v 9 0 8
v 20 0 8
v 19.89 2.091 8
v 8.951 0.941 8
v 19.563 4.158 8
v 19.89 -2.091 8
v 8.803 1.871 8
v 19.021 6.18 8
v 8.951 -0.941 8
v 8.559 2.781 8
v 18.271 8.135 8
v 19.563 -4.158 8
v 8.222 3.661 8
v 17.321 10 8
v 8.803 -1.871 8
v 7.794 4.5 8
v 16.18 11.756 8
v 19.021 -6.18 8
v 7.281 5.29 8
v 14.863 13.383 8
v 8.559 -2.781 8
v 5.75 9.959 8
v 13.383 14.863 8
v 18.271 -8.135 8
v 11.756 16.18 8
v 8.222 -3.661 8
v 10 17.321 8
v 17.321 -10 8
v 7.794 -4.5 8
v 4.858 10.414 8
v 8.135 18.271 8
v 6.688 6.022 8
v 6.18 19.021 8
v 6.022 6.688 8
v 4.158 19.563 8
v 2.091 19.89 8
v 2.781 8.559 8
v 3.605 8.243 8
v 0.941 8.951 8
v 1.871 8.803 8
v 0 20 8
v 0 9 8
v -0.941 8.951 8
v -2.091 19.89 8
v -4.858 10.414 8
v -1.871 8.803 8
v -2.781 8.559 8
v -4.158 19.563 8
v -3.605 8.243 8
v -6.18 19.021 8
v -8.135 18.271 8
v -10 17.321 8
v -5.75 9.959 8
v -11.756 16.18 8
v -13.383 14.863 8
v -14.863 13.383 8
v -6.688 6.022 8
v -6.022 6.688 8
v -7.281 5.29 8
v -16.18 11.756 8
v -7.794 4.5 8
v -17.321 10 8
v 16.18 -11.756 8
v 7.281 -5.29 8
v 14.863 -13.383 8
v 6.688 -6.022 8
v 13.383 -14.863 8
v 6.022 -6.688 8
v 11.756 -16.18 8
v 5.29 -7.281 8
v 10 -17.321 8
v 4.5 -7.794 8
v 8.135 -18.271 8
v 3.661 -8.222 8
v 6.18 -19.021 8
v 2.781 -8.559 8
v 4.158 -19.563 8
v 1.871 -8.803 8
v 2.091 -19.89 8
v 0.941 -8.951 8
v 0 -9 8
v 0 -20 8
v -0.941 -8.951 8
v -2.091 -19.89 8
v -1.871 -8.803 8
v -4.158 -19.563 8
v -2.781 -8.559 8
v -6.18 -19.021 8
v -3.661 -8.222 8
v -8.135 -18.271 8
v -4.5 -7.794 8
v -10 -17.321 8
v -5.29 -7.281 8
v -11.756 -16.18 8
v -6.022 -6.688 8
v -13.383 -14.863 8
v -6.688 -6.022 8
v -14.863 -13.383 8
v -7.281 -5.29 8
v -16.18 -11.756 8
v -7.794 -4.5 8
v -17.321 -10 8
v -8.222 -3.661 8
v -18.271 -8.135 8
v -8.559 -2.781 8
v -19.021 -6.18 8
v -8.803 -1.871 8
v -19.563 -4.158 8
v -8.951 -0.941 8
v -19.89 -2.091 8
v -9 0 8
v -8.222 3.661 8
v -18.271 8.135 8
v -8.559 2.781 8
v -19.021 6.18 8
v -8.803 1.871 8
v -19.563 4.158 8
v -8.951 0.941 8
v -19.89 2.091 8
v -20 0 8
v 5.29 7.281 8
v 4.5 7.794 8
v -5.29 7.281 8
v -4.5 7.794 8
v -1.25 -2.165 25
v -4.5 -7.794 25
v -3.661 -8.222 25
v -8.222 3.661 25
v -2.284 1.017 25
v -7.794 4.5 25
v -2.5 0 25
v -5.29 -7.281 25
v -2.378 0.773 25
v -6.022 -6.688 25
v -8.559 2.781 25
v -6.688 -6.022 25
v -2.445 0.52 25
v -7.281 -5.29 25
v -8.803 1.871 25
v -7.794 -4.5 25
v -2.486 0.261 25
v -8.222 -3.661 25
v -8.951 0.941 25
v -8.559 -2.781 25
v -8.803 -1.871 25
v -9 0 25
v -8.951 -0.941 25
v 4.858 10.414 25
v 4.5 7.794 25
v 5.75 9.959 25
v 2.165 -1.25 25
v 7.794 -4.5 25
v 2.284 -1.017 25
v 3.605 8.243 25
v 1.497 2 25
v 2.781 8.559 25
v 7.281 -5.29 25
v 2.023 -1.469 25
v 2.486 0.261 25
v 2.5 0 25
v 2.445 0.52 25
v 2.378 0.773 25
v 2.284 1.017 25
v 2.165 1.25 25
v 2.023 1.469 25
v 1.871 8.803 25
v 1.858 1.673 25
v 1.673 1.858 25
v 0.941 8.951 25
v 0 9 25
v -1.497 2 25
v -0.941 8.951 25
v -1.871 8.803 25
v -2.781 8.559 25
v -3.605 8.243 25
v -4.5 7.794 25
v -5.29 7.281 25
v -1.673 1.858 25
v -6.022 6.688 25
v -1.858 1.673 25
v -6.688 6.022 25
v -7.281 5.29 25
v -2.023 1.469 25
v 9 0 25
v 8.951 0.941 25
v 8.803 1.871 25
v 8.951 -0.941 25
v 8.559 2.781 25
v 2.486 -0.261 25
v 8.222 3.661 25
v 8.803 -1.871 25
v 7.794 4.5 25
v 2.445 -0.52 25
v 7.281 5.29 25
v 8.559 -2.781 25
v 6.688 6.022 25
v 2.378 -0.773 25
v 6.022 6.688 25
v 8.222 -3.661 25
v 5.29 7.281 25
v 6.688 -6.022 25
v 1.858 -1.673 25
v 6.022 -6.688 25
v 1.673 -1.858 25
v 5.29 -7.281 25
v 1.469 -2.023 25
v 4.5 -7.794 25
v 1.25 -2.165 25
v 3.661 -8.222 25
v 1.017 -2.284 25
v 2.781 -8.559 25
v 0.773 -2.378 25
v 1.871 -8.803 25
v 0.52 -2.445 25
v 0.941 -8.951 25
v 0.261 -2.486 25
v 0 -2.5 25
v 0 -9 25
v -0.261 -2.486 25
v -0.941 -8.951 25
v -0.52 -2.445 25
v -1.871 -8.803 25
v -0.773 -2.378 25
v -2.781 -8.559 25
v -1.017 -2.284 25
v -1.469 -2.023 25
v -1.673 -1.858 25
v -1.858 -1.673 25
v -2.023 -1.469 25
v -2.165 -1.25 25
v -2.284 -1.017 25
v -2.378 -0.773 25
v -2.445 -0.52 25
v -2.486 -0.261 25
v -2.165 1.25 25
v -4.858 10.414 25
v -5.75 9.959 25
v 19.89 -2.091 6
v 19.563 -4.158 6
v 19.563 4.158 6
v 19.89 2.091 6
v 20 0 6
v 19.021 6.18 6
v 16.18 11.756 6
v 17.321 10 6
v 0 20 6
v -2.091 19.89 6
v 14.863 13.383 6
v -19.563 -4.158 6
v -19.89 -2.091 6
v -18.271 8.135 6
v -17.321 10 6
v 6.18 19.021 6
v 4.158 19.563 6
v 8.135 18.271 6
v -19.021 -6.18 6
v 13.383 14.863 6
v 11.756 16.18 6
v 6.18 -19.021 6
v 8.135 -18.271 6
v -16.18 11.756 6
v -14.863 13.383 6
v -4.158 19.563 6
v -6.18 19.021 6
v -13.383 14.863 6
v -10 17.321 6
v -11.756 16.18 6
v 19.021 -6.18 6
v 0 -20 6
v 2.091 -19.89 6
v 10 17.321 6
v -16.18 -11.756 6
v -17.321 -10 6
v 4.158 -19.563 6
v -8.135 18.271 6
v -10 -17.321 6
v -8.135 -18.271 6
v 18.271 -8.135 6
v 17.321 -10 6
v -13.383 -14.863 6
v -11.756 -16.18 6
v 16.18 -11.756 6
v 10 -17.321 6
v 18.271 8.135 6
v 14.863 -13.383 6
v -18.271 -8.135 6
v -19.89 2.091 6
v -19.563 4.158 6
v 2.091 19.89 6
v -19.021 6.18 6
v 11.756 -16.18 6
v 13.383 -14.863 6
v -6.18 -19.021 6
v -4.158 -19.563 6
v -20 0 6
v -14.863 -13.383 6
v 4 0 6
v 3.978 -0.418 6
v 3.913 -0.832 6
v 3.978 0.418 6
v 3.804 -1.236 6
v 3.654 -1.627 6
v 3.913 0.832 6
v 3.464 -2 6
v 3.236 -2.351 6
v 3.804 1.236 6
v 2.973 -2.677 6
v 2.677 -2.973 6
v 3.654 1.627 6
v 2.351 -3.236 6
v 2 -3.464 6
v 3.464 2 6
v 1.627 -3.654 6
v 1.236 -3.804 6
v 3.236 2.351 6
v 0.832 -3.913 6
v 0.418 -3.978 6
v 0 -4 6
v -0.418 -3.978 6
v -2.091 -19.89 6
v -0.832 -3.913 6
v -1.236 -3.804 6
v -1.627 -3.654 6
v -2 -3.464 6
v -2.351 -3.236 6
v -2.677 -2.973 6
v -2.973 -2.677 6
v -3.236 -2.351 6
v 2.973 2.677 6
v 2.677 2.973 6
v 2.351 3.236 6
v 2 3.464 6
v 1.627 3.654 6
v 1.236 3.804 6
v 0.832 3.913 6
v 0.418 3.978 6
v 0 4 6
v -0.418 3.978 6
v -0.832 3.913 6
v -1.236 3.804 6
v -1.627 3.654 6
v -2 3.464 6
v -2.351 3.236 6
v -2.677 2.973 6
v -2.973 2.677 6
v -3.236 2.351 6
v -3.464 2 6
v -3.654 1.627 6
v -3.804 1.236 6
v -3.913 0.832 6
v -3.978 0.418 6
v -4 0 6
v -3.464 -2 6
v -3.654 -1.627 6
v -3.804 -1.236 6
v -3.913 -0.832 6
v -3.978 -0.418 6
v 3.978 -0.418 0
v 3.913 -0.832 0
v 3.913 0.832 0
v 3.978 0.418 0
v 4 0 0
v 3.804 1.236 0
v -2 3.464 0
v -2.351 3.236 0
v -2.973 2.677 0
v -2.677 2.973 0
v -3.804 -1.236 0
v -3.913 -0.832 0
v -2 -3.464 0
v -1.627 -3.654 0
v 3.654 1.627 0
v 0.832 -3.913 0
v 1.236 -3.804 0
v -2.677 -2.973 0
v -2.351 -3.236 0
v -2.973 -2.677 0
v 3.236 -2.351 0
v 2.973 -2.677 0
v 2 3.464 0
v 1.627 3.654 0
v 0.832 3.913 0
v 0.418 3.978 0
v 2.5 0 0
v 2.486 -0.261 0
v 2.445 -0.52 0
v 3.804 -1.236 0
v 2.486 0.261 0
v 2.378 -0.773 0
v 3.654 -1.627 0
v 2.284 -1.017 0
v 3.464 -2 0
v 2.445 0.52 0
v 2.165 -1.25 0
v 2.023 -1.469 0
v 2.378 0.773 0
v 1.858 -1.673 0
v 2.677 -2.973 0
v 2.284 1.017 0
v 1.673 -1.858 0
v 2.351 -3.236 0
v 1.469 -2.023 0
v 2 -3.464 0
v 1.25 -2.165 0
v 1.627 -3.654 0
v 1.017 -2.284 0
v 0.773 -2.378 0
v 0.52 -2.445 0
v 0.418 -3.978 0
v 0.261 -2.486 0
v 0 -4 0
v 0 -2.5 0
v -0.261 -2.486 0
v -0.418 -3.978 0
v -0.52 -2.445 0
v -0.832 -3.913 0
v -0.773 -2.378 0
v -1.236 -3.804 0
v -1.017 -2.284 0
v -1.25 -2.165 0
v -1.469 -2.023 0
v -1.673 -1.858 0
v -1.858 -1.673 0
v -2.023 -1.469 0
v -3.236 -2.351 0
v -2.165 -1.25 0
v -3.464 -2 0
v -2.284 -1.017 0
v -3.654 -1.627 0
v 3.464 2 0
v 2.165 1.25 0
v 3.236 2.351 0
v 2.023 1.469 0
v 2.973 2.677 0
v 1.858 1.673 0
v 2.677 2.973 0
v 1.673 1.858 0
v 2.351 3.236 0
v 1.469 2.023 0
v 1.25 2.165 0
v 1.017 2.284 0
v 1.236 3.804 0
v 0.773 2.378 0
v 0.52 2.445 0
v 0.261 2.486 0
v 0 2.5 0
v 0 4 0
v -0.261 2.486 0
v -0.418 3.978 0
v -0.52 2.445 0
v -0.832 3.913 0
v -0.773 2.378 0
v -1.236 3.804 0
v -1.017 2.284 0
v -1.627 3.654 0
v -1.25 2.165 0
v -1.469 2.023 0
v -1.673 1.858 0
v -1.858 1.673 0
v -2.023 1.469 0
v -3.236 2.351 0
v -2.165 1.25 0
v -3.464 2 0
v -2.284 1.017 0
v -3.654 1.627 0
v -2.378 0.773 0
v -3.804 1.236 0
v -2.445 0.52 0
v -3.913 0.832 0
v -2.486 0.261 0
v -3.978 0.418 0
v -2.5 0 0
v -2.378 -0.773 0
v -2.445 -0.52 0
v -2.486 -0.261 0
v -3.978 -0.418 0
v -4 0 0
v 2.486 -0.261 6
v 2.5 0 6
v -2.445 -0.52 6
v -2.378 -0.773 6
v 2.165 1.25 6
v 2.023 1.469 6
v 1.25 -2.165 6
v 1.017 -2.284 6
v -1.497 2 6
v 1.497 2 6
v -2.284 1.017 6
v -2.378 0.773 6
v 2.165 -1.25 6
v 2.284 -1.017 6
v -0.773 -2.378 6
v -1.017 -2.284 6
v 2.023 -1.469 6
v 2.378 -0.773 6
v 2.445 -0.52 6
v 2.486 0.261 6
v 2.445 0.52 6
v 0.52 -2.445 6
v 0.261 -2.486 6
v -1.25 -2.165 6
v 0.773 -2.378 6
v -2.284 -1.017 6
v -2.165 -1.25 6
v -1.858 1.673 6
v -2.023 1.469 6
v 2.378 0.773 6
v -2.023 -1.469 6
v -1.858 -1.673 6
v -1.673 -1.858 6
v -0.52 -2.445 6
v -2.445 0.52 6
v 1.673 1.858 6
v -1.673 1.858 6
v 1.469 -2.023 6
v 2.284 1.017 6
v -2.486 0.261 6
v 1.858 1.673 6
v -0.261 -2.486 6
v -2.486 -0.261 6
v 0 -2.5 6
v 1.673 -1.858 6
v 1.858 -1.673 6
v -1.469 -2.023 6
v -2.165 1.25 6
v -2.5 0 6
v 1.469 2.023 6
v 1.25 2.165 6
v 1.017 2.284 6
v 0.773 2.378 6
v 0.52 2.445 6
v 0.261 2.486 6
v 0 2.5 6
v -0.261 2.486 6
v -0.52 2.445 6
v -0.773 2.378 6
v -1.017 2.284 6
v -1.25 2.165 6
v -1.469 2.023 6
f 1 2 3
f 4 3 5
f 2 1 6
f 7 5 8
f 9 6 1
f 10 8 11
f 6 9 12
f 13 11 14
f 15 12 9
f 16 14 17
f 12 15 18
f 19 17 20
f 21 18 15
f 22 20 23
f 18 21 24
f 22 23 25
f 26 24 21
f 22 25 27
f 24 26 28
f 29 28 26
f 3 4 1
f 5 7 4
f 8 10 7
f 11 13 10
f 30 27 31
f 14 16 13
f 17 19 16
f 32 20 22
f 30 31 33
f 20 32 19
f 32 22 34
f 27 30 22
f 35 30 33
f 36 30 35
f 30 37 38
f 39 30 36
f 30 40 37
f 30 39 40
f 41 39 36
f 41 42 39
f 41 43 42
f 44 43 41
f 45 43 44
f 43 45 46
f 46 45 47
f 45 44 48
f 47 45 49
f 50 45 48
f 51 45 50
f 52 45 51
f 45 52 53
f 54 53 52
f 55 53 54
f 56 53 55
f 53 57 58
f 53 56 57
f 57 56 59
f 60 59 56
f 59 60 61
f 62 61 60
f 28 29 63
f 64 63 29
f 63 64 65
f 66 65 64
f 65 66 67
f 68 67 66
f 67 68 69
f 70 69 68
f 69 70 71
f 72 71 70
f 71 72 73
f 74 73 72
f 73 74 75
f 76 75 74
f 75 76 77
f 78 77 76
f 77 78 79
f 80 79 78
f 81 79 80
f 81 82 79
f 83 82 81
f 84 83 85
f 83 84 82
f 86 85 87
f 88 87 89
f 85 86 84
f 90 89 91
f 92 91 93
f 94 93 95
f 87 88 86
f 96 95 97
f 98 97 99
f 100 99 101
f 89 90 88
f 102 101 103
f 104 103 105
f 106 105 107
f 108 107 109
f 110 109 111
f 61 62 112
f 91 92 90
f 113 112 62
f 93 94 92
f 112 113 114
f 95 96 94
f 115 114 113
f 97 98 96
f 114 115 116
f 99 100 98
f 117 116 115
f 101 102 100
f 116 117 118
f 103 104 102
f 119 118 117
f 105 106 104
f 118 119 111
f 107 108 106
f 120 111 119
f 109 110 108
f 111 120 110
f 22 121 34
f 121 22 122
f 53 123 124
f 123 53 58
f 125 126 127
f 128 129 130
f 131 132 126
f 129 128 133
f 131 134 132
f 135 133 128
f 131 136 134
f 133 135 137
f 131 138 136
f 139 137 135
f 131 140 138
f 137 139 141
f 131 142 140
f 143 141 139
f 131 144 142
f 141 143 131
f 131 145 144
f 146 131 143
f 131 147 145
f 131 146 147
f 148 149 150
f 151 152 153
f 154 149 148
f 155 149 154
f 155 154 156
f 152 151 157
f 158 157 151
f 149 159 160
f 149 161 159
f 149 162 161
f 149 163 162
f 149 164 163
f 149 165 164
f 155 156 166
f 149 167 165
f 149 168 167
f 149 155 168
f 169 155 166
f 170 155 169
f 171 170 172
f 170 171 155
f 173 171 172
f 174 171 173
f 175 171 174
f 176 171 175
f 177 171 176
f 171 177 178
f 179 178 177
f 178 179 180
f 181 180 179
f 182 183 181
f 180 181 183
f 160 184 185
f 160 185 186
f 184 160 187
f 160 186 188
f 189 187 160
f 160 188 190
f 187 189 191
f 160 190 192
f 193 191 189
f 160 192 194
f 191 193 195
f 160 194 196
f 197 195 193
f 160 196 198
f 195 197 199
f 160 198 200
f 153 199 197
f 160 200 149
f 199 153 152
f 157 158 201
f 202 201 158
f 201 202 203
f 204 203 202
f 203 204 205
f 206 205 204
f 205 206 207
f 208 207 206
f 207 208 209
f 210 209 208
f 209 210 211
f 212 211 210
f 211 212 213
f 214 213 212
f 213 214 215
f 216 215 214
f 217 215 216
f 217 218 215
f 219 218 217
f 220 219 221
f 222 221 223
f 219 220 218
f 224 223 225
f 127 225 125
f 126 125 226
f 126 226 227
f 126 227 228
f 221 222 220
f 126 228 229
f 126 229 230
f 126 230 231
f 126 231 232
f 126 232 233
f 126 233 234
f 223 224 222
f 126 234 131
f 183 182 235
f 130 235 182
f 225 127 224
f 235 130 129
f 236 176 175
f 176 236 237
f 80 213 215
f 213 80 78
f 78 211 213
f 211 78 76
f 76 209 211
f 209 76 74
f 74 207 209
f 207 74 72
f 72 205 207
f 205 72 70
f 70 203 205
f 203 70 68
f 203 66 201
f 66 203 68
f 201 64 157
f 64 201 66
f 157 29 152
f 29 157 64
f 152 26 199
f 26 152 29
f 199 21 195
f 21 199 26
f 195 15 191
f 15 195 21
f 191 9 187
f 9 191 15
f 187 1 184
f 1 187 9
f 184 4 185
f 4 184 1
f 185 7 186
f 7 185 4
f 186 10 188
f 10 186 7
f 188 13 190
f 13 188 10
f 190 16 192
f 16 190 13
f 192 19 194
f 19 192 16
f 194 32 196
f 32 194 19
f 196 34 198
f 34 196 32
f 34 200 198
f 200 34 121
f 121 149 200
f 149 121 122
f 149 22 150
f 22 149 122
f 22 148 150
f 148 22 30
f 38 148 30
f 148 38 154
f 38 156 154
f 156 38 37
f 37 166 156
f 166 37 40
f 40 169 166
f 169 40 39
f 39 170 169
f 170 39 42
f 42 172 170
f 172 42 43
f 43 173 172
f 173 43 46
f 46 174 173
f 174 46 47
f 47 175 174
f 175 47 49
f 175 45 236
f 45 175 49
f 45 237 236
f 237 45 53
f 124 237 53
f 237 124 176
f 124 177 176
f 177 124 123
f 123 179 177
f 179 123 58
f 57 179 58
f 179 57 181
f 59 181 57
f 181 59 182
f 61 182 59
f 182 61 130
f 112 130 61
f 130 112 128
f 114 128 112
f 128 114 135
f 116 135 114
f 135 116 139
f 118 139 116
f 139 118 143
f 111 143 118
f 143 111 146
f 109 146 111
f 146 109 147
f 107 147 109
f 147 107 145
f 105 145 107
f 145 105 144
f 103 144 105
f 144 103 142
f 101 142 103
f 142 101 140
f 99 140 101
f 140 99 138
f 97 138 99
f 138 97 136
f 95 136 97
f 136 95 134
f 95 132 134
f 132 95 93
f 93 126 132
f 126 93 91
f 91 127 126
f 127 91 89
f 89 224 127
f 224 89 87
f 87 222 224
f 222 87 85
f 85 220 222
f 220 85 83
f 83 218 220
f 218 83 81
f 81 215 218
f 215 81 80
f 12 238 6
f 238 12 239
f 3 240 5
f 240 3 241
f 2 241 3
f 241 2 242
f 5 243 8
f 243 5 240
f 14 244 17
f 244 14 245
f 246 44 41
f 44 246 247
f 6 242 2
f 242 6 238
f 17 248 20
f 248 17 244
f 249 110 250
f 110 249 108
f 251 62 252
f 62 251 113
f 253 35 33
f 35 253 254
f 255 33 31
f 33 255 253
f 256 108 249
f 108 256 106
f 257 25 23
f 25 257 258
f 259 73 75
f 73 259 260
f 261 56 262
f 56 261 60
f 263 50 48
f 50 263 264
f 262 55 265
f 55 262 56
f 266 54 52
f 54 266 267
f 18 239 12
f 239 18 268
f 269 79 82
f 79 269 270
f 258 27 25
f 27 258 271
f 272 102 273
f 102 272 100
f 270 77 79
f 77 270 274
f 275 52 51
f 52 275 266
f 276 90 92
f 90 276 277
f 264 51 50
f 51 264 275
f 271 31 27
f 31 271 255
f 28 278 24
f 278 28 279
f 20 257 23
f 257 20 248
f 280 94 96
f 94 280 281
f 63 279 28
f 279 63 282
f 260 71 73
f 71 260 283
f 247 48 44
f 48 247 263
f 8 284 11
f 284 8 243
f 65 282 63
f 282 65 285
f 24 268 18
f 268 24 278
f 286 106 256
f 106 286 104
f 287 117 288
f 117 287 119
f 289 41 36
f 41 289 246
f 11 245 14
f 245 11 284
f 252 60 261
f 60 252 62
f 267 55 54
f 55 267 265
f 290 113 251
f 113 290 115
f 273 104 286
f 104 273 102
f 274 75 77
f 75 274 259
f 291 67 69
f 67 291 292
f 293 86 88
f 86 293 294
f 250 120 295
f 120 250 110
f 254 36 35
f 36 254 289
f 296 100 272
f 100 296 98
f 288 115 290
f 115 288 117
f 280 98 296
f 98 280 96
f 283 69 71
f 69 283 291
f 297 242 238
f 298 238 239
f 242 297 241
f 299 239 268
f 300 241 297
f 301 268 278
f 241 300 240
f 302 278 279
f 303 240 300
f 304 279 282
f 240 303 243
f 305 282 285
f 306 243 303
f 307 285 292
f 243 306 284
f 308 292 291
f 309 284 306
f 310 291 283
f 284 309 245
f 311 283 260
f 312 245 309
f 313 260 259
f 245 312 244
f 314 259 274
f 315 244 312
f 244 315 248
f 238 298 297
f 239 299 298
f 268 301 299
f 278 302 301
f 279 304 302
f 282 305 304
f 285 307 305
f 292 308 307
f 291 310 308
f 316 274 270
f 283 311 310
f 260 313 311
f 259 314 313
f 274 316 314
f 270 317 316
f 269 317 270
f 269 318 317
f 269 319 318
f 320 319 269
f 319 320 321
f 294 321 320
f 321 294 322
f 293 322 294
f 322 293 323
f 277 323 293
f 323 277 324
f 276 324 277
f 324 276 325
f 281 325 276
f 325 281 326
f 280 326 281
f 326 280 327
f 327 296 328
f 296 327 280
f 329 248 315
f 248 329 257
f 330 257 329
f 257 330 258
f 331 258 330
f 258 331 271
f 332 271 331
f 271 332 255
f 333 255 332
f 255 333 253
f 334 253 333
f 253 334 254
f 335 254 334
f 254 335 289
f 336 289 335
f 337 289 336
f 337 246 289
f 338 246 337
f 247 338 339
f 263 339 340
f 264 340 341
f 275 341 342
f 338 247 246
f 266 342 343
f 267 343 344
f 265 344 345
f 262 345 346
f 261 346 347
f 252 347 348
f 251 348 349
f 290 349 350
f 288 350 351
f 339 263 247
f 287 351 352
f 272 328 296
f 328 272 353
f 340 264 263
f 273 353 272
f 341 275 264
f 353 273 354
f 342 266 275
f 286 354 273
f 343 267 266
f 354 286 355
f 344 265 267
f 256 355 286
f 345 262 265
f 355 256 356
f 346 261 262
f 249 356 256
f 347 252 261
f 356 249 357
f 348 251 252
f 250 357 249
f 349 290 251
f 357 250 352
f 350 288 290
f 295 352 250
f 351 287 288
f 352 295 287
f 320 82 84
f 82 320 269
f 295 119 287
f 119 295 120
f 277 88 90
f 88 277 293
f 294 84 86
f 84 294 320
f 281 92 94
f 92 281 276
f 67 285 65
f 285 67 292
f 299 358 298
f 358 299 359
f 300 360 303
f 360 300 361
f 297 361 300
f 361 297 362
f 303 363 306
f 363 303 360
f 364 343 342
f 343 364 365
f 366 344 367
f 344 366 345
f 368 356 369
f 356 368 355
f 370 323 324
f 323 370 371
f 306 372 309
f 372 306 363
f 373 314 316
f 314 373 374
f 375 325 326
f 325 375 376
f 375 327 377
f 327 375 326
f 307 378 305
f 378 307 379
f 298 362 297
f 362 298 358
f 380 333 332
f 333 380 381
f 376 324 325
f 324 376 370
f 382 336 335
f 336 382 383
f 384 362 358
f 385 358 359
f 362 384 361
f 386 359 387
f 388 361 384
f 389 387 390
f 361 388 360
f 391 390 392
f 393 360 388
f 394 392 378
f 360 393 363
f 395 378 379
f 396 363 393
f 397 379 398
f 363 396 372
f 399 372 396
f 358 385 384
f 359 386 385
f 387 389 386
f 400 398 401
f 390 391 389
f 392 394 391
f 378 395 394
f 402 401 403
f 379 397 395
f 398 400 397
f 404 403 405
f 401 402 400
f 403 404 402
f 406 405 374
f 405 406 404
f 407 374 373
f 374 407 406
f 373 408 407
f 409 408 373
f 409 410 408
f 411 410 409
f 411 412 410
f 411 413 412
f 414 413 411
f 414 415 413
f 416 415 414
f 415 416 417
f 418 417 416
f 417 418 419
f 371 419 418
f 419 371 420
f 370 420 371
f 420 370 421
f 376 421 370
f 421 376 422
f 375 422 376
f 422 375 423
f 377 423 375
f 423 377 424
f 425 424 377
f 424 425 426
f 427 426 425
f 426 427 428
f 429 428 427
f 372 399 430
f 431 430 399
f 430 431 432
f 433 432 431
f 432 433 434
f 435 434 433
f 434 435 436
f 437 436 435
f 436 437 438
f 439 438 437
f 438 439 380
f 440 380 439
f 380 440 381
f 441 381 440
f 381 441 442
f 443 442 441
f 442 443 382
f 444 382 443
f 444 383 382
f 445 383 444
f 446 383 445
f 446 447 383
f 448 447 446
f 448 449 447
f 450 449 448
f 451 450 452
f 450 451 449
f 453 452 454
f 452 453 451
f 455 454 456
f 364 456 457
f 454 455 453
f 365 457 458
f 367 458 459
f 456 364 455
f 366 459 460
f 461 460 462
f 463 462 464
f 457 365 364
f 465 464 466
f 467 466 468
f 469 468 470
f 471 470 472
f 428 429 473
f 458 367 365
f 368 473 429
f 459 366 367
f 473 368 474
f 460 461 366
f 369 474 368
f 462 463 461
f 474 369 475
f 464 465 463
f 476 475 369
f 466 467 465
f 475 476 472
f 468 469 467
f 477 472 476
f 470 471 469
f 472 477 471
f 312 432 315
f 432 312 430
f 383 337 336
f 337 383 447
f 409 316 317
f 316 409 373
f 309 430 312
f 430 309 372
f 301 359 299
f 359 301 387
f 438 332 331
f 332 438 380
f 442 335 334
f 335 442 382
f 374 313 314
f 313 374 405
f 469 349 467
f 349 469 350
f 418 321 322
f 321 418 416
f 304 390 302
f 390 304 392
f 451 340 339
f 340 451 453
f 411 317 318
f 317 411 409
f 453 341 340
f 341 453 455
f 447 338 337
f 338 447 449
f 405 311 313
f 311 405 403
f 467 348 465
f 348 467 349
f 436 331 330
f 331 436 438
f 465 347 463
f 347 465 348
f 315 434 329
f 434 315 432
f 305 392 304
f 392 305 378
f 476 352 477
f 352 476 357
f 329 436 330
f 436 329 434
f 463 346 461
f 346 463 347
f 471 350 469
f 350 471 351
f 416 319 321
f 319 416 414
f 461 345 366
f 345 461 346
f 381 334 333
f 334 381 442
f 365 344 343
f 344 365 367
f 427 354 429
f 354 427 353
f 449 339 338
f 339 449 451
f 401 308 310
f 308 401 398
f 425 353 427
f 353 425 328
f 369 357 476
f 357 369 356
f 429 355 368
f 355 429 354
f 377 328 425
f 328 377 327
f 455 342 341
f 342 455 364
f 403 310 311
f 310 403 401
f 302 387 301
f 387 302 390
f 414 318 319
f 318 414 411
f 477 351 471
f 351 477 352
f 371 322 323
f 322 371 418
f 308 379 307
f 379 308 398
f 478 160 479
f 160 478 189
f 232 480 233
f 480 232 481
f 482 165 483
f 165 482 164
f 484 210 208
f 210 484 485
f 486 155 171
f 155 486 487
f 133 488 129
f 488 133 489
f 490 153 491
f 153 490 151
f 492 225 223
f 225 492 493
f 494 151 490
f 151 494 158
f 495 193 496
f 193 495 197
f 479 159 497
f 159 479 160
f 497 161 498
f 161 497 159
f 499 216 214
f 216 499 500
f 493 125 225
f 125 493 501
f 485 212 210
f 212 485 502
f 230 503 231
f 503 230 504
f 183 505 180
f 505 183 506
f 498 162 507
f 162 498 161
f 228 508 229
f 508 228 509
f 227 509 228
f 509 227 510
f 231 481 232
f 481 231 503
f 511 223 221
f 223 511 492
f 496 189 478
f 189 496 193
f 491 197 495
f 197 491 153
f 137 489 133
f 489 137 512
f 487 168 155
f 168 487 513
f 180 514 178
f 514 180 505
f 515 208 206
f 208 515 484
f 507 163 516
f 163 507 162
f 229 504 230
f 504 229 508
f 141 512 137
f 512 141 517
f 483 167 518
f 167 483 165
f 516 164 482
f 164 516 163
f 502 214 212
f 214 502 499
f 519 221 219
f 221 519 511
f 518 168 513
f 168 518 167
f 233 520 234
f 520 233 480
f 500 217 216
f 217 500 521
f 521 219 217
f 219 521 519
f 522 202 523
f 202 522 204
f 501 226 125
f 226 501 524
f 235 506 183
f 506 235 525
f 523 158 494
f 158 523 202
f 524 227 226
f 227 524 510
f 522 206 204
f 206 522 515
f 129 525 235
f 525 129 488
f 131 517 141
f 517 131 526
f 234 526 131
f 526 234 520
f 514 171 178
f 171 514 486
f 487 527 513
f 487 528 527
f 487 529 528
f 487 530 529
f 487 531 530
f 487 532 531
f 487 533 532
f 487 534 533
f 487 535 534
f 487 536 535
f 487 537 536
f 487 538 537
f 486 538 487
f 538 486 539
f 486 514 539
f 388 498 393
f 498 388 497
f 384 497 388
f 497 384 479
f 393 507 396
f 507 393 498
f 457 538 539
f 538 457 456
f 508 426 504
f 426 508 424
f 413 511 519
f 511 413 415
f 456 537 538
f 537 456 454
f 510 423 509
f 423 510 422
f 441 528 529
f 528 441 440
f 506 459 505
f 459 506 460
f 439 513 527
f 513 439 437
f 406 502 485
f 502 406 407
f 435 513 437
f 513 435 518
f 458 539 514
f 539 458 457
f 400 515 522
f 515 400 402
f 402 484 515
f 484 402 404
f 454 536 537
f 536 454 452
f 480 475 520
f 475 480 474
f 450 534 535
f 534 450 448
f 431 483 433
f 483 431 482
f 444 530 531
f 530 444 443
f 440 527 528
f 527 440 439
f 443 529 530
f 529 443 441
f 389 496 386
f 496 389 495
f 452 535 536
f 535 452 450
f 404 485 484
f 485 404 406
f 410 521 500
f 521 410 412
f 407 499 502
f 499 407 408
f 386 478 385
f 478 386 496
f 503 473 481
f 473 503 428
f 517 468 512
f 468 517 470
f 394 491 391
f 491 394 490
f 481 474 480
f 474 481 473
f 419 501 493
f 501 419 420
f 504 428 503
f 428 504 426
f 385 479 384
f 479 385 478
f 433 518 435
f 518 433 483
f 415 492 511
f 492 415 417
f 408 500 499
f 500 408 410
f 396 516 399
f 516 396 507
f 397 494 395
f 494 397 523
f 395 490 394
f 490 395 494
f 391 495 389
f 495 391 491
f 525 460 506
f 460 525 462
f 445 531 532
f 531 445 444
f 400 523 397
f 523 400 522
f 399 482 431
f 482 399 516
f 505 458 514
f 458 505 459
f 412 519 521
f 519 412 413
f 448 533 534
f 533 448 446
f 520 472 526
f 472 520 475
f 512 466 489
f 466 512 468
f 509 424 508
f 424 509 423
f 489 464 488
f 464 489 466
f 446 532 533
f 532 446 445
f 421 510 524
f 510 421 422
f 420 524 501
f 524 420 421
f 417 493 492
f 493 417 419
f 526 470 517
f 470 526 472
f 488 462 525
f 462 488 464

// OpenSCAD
// file: ../vitamins/blind.scad
$fn = 60;

module blind(length = 10) {
    // Inner radius
    r = 11.5;

    module tube() {
        difference() {
            circle(r = r + 0.5);
            circle(r = r);
        }
    }

    module fins () {
        inner_gap = 6;
        outer_gap = 8;
        h = 2;
        w = 1;

        angle = acos(((outer_gap - inner_gap) / 2) / 2);

        g = inner_gap / 2;
        offset = sqrt(r*r - g*g) - h;

        for (i = [0, 1]) {
            mirror([i, 0, 0])
            translate([g, offset])
            rotate([0, 0, -(90 - angle)])
            square([w, h]);
        }
    }

    linear_extrude(height = length) {
        fins();
        tube();
    }
}

blind();
// main file
use <../vitamins/blind.scad>

$fn = 60;

module adaptor() {
    // Inner radius of blind:
    r = 11.5;
    // Height of this adaptor
    h = 25;
    // Height of circular part before flat bit to catch shaft:
    circular_height = 6;
    // Height of flat part of shaft:
    flat_height = h - circular_height;
    // Height of connector, which sits in bracket:
    connector_height = 6;
    // Height of lip, that sits between blind and bracket:
    lip_height = 2;
    // Diameter of shaft:
    shaft_diameter = 5;

    module fin() {
        intersection() {
            rotate([0, 0, 60])
            square([r, 1]);

            // Intersect with blind's inner radius to ensure edges of fin doesn't
            // overlap.
            circle(r = r);
        }
    }

    module inner() {
        circle(d = 18);

        for (i = [0, 1]) {
            mirror([i, 0, 0])
            fin();
        }
    }

    module shaft() {
        // Flat bit:
        translate([0, 0, circular_height])
        linear_extrude(height = flat_height)
        difference() {
            circle(d = shaft_diameter);

            translate([-(shaft_diameter / 2), 2])
            square([shaft_diameter, shaft_diameter]);
        }

        // Round bit:
        cylinder(d = shaft_diameter, h = circular_height);
    }

    difference() {
        union() {
            // Inside the blind, connects to motor shaft:
            translate([0, 0, lip_height + connector_height])
            linear_extrude(h - lip_height - connector_height)
            inner();

            // Lip, caps end of blinds fabric:
            color("red")
            translate([0, 0, connector_height])
            cylinder(d = 40, h = lip_height);

            // Connector, into bracket:
            color("cyan")
            cylinder(d = 8, h = connector_height);
        }

        shaft();
    }
}

adaptor();
